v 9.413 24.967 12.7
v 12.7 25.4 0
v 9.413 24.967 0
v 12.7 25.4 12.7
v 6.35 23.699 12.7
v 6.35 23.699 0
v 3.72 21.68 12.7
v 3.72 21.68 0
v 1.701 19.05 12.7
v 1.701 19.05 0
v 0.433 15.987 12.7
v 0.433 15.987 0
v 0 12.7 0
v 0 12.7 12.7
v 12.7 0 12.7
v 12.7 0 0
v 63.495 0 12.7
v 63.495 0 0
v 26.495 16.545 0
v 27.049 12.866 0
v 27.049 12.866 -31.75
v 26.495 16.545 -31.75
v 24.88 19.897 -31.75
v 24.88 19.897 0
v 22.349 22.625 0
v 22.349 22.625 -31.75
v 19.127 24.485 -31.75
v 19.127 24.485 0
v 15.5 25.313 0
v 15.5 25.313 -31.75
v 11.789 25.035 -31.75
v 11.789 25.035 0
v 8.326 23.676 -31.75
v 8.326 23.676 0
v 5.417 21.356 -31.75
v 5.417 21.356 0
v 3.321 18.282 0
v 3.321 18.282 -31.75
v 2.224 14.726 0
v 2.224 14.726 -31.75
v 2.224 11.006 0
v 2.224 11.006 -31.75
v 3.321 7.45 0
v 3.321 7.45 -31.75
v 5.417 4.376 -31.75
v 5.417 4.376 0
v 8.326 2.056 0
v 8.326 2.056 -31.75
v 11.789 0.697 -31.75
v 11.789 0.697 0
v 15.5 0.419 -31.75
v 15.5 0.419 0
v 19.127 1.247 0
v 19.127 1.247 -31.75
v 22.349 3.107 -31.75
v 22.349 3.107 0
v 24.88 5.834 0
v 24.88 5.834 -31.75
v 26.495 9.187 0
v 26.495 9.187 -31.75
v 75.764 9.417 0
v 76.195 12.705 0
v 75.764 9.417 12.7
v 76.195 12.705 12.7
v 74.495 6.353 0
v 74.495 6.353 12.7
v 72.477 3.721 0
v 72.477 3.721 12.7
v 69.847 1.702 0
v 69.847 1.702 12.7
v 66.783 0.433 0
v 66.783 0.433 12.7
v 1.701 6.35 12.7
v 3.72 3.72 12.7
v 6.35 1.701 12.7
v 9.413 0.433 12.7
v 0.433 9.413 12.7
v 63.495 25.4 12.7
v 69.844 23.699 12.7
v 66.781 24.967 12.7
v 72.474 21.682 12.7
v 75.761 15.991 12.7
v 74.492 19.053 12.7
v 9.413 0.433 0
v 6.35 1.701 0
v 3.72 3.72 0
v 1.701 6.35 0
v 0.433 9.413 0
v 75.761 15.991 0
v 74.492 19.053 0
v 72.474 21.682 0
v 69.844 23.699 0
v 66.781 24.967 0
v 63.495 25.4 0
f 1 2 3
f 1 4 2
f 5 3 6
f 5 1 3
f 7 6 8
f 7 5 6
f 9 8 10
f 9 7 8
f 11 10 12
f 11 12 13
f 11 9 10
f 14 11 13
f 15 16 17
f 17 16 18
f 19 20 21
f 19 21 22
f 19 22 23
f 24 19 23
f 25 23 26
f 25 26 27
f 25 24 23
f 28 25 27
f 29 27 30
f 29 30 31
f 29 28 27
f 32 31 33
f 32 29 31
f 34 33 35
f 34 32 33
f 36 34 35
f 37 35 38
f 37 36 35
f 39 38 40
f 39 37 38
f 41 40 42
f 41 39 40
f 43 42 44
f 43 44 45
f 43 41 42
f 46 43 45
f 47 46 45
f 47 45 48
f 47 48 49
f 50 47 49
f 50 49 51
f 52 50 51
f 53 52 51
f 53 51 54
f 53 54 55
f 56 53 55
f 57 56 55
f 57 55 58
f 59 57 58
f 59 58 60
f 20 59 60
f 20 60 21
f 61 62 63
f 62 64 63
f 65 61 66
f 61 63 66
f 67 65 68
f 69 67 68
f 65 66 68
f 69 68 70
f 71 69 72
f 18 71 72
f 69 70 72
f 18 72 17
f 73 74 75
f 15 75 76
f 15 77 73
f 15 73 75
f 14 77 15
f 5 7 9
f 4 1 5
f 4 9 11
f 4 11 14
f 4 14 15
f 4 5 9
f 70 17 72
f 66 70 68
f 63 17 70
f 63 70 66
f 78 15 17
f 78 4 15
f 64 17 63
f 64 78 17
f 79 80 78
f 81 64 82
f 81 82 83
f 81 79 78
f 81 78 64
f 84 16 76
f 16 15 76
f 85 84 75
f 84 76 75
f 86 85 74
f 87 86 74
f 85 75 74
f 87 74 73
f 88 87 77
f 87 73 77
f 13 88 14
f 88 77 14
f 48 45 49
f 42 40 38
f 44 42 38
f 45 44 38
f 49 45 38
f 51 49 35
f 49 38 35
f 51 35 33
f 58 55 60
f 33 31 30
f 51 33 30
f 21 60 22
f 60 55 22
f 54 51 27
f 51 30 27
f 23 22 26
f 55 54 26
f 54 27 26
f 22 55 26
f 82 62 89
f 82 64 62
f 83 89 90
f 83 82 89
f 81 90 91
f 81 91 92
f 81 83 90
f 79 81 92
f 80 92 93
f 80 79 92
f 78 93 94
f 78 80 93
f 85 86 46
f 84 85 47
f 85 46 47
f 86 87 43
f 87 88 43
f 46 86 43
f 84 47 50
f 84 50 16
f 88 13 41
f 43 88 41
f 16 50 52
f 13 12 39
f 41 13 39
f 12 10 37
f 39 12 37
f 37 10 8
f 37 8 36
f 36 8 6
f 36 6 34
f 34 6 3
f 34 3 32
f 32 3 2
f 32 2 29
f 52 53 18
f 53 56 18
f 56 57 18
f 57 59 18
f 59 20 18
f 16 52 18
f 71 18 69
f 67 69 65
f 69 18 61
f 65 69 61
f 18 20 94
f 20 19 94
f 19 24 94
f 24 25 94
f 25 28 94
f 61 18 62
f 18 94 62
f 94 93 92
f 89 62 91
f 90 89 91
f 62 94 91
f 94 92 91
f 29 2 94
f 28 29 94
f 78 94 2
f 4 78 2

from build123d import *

# Parameters (mm, degrees)
F1_DEPTH = 12.7
F2_R     = 12.7
F3_R     = 12.69999
F4_R     = 12.4821589041
F5_DEPTH = 31.75
F6_DEPTH = 12.7
F7_R     = 12.7
F8_R     = 12.69999


# Not quite as in the source:
# - a fillet or chamfer is up to 0.001 mm smaller than in the source, because OpenCascade refuses the exact size
# - the program builds the solid bodies; features that only make, move or delete a surface that nothing else refers to are left out


with BuildPart() as f1:
    # F0 (on Top) → F1 (new body)
    with BuildSketch(Plane.XY):
        Polygon((0, 25.4), (0, 0), (76.2, 0), (76.1904343963, 25.4), align=None)
    extrude(amount=F1_DEPTH)

    # F2
    f2_edges = [f1.edges().sort_by_distance(p)[0] for p in [
        (76.190434, 25.4, 6.35),
    ]]
    fillet(f2_edges, radius=F2_R)

    # F3 (radius 12.7 in the source; OpenCascade refuses exactly that, so slightly less here)
    f3_edges = [f1.edges().sort_by_distance(p)[0] for p in [
        (76.2, 0, 6.35),
    ]]
    fillet(f3_edges, radius=F3_R)

    # F4 (on Top) → F5 (join)
    with BuildSketch(Plane.XY):
        with Locations((14.5669719204, 12.8659298643)):
            Circle(F4_R)
    extrude(amount=-F5_DEPTH)

    # F6 (add): a face of the model
    f6_faces = [f1.faces().sort_by_distance(p)[0] for p in [
        (14.5669719204, 12.8659298643, -31.75),
    ]]
    extrude(f6_faces, amount=-F6_DEPTH)

    # F7
    f7_edges = [f1.edges().sort_by_distance(p)[0] for p in [
        (0, 0, 6.35),
    ]]
    fillet(f7_edges, radius=F7_R)

    # F8 (radius 12.7 in the source; OpenCascade refuses exactly that, so slightly less here)
    f8_edges = [f1.edges().sort_by_distance(p)[0] for p in [
        (0, 25.4, 6.35),
    ]]
    fillet(f8_edges, radius=F8_R)


solid = f1.part
